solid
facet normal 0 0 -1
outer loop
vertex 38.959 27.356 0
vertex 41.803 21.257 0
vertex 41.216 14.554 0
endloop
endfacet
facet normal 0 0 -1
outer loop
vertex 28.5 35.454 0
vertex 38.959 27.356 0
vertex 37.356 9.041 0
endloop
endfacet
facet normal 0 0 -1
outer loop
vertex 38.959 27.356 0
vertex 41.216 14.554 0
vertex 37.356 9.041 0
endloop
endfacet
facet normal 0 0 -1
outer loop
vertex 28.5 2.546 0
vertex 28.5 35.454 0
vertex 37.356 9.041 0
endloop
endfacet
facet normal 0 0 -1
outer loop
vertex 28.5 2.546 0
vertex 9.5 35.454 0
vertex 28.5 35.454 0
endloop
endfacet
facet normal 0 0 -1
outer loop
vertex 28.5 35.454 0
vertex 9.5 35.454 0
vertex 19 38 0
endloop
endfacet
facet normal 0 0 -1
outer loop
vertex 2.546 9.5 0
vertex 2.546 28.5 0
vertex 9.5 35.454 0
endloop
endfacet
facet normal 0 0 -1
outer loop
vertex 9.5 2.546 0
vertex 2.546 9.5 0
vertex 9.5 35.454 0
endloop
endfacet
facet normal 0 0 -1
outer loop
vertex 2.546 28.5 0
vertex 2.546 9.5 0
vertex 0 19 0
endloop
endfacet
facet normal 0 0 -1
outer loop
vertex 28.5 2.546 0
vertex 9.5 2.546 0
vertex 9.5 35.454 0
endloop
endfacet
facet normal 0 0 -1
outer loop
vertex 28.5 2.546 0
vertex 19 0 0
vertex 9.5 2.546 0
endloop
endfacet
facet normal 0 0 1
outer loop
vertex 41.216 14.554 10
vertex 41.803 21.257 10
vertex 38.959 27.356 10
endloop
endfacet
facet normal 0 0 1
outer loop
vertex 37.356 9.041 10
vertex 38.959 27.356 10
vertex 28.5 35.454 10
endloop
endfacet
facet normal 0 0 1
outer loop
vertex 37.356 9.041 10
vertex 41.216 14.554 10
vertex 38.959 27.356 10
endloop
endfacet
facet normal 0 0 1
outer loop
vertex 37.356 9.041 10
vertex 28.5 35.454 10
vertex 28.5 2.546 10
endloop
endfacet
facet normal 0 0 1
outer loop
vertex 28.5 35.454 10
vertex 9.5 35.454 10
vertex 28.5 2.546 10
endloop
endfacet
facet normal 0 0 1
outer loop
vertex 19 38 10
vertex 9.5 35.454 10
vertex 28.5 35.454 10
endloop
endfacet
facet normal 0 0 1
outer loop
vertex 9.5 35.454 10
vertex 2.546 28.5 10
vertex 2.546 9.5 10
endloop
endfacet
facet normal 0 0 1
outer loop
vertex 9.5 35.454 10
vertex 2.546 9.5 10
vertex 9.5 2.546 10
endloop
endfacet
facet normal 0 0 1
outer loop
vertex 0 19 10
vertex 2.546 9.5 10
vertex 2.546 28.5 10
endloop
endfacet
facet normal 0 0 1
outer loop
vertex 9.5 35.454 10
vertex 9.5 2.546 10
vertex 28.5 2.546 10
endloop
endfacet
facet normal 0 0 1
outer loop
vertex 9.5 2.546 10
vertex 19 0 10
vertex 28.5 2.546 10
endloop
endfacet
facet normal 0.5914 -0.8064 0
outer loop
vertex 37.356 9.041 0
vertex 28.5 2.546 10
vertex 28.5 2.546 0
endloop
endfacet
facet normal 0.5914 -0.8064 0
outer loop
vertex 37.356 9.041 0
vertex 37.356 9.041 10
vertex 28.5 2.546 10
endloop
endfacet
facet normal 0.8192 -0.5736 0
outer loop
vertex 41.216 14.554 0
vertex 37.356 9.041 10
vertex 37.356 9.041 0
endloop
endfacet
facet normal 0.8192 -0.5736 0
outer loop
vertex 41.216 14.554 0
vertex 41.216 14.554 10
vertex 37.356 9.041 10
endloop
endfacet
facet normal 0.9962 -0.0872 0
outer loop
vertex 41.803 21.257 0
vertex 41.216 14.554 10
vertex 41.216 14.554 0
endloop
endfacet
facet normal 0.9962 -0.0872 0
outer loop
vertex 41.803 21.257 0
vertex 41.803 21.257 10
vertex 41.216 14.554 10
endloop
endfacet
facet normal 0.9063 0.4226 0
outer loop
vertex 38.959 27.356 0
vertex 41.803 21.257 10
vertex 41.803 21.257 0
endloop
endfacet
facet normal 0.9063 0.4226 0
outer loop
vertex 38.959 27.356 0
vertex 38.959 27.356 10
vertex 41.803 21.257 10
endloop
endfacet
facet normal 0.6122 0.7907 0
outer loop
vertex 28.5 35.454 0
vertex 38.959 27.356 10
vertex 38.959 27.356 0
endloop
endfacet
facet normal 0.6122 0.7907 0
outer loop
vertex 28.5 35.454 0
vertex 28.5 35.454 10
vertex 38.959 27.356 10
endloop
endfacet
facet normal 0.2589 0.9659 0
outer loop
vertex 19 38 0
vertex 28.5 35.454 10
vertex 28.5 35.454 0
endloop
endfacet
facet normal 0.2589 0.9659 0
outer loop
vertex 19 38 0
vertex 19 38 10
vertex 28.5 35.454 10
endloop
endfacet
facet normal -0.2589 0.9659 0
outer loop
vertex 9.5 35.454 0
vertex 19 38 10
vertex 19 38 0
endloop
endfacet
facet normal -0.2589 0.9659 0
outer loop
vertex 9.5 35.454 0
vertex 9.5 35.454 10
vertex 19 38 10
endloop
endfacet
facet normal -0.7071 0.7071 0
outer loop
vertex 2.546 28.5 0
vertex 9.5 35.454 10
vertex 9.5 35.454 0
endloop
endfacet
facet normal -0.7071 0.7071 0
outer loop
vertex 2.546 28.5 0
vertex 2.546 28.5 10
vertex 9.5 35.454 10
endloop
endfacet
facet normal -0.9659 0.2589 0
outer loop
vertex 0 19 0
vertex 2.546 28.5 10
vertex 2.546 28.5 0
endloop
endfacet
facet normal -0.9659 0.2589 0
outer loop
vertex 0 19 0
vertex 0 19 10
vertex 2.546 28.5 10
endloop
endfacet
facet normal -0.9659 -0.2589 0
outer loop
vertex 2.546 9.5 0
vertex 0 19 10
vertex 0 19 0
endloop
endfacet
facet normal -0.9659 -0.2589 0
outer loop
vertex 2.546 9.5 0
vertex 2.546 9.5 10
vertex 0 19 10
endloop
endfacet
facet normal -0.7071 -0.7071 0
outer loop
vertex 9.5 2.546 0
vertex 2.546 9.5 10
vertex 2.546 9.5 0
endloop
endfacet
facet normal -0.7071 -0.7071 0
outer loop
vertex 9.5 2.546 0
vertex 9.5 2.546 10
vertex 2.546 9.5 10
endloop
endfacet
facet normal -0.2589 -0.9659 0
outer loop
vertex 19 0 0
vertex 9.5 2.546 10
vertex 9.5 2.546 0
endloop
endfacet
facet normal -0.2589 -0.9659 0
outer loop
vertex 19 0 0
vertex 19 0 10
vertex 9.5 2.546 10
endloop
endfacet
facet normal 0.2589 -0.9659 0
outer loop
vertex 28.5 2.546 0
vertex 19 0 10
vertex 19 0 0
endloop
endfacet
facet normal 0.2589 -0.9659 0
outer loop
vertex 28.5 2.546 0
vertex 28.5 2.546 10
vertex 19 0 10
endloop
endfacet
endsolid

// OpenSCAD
$fn = 32;

// ----------------------------------------------------------------------
// Eccentric disc: step, 10 mm thick
// ----------------------------------------------------------------------

// --- parameters (mm) ---
profile_height = 10;      // extrusion height
profile_points = 13;      // points of the closed outline

profile = [[0, 19], [2.546, 9.5], [9.5, 2.546], [19, 0], [28.5, 2.546], [37.356, 9.041], [41.216, 14.554], [41.803, 21.257], [38.959, 27.356], [28.5, 35.454], [19, 38], [9.5, 35.454], [2.546, 28.5]];  // single closed polygon, 13 points, counter clockwise

// --- the one profile operation ---
linear_extrude(height = profile_height) polygon(points = profile);
